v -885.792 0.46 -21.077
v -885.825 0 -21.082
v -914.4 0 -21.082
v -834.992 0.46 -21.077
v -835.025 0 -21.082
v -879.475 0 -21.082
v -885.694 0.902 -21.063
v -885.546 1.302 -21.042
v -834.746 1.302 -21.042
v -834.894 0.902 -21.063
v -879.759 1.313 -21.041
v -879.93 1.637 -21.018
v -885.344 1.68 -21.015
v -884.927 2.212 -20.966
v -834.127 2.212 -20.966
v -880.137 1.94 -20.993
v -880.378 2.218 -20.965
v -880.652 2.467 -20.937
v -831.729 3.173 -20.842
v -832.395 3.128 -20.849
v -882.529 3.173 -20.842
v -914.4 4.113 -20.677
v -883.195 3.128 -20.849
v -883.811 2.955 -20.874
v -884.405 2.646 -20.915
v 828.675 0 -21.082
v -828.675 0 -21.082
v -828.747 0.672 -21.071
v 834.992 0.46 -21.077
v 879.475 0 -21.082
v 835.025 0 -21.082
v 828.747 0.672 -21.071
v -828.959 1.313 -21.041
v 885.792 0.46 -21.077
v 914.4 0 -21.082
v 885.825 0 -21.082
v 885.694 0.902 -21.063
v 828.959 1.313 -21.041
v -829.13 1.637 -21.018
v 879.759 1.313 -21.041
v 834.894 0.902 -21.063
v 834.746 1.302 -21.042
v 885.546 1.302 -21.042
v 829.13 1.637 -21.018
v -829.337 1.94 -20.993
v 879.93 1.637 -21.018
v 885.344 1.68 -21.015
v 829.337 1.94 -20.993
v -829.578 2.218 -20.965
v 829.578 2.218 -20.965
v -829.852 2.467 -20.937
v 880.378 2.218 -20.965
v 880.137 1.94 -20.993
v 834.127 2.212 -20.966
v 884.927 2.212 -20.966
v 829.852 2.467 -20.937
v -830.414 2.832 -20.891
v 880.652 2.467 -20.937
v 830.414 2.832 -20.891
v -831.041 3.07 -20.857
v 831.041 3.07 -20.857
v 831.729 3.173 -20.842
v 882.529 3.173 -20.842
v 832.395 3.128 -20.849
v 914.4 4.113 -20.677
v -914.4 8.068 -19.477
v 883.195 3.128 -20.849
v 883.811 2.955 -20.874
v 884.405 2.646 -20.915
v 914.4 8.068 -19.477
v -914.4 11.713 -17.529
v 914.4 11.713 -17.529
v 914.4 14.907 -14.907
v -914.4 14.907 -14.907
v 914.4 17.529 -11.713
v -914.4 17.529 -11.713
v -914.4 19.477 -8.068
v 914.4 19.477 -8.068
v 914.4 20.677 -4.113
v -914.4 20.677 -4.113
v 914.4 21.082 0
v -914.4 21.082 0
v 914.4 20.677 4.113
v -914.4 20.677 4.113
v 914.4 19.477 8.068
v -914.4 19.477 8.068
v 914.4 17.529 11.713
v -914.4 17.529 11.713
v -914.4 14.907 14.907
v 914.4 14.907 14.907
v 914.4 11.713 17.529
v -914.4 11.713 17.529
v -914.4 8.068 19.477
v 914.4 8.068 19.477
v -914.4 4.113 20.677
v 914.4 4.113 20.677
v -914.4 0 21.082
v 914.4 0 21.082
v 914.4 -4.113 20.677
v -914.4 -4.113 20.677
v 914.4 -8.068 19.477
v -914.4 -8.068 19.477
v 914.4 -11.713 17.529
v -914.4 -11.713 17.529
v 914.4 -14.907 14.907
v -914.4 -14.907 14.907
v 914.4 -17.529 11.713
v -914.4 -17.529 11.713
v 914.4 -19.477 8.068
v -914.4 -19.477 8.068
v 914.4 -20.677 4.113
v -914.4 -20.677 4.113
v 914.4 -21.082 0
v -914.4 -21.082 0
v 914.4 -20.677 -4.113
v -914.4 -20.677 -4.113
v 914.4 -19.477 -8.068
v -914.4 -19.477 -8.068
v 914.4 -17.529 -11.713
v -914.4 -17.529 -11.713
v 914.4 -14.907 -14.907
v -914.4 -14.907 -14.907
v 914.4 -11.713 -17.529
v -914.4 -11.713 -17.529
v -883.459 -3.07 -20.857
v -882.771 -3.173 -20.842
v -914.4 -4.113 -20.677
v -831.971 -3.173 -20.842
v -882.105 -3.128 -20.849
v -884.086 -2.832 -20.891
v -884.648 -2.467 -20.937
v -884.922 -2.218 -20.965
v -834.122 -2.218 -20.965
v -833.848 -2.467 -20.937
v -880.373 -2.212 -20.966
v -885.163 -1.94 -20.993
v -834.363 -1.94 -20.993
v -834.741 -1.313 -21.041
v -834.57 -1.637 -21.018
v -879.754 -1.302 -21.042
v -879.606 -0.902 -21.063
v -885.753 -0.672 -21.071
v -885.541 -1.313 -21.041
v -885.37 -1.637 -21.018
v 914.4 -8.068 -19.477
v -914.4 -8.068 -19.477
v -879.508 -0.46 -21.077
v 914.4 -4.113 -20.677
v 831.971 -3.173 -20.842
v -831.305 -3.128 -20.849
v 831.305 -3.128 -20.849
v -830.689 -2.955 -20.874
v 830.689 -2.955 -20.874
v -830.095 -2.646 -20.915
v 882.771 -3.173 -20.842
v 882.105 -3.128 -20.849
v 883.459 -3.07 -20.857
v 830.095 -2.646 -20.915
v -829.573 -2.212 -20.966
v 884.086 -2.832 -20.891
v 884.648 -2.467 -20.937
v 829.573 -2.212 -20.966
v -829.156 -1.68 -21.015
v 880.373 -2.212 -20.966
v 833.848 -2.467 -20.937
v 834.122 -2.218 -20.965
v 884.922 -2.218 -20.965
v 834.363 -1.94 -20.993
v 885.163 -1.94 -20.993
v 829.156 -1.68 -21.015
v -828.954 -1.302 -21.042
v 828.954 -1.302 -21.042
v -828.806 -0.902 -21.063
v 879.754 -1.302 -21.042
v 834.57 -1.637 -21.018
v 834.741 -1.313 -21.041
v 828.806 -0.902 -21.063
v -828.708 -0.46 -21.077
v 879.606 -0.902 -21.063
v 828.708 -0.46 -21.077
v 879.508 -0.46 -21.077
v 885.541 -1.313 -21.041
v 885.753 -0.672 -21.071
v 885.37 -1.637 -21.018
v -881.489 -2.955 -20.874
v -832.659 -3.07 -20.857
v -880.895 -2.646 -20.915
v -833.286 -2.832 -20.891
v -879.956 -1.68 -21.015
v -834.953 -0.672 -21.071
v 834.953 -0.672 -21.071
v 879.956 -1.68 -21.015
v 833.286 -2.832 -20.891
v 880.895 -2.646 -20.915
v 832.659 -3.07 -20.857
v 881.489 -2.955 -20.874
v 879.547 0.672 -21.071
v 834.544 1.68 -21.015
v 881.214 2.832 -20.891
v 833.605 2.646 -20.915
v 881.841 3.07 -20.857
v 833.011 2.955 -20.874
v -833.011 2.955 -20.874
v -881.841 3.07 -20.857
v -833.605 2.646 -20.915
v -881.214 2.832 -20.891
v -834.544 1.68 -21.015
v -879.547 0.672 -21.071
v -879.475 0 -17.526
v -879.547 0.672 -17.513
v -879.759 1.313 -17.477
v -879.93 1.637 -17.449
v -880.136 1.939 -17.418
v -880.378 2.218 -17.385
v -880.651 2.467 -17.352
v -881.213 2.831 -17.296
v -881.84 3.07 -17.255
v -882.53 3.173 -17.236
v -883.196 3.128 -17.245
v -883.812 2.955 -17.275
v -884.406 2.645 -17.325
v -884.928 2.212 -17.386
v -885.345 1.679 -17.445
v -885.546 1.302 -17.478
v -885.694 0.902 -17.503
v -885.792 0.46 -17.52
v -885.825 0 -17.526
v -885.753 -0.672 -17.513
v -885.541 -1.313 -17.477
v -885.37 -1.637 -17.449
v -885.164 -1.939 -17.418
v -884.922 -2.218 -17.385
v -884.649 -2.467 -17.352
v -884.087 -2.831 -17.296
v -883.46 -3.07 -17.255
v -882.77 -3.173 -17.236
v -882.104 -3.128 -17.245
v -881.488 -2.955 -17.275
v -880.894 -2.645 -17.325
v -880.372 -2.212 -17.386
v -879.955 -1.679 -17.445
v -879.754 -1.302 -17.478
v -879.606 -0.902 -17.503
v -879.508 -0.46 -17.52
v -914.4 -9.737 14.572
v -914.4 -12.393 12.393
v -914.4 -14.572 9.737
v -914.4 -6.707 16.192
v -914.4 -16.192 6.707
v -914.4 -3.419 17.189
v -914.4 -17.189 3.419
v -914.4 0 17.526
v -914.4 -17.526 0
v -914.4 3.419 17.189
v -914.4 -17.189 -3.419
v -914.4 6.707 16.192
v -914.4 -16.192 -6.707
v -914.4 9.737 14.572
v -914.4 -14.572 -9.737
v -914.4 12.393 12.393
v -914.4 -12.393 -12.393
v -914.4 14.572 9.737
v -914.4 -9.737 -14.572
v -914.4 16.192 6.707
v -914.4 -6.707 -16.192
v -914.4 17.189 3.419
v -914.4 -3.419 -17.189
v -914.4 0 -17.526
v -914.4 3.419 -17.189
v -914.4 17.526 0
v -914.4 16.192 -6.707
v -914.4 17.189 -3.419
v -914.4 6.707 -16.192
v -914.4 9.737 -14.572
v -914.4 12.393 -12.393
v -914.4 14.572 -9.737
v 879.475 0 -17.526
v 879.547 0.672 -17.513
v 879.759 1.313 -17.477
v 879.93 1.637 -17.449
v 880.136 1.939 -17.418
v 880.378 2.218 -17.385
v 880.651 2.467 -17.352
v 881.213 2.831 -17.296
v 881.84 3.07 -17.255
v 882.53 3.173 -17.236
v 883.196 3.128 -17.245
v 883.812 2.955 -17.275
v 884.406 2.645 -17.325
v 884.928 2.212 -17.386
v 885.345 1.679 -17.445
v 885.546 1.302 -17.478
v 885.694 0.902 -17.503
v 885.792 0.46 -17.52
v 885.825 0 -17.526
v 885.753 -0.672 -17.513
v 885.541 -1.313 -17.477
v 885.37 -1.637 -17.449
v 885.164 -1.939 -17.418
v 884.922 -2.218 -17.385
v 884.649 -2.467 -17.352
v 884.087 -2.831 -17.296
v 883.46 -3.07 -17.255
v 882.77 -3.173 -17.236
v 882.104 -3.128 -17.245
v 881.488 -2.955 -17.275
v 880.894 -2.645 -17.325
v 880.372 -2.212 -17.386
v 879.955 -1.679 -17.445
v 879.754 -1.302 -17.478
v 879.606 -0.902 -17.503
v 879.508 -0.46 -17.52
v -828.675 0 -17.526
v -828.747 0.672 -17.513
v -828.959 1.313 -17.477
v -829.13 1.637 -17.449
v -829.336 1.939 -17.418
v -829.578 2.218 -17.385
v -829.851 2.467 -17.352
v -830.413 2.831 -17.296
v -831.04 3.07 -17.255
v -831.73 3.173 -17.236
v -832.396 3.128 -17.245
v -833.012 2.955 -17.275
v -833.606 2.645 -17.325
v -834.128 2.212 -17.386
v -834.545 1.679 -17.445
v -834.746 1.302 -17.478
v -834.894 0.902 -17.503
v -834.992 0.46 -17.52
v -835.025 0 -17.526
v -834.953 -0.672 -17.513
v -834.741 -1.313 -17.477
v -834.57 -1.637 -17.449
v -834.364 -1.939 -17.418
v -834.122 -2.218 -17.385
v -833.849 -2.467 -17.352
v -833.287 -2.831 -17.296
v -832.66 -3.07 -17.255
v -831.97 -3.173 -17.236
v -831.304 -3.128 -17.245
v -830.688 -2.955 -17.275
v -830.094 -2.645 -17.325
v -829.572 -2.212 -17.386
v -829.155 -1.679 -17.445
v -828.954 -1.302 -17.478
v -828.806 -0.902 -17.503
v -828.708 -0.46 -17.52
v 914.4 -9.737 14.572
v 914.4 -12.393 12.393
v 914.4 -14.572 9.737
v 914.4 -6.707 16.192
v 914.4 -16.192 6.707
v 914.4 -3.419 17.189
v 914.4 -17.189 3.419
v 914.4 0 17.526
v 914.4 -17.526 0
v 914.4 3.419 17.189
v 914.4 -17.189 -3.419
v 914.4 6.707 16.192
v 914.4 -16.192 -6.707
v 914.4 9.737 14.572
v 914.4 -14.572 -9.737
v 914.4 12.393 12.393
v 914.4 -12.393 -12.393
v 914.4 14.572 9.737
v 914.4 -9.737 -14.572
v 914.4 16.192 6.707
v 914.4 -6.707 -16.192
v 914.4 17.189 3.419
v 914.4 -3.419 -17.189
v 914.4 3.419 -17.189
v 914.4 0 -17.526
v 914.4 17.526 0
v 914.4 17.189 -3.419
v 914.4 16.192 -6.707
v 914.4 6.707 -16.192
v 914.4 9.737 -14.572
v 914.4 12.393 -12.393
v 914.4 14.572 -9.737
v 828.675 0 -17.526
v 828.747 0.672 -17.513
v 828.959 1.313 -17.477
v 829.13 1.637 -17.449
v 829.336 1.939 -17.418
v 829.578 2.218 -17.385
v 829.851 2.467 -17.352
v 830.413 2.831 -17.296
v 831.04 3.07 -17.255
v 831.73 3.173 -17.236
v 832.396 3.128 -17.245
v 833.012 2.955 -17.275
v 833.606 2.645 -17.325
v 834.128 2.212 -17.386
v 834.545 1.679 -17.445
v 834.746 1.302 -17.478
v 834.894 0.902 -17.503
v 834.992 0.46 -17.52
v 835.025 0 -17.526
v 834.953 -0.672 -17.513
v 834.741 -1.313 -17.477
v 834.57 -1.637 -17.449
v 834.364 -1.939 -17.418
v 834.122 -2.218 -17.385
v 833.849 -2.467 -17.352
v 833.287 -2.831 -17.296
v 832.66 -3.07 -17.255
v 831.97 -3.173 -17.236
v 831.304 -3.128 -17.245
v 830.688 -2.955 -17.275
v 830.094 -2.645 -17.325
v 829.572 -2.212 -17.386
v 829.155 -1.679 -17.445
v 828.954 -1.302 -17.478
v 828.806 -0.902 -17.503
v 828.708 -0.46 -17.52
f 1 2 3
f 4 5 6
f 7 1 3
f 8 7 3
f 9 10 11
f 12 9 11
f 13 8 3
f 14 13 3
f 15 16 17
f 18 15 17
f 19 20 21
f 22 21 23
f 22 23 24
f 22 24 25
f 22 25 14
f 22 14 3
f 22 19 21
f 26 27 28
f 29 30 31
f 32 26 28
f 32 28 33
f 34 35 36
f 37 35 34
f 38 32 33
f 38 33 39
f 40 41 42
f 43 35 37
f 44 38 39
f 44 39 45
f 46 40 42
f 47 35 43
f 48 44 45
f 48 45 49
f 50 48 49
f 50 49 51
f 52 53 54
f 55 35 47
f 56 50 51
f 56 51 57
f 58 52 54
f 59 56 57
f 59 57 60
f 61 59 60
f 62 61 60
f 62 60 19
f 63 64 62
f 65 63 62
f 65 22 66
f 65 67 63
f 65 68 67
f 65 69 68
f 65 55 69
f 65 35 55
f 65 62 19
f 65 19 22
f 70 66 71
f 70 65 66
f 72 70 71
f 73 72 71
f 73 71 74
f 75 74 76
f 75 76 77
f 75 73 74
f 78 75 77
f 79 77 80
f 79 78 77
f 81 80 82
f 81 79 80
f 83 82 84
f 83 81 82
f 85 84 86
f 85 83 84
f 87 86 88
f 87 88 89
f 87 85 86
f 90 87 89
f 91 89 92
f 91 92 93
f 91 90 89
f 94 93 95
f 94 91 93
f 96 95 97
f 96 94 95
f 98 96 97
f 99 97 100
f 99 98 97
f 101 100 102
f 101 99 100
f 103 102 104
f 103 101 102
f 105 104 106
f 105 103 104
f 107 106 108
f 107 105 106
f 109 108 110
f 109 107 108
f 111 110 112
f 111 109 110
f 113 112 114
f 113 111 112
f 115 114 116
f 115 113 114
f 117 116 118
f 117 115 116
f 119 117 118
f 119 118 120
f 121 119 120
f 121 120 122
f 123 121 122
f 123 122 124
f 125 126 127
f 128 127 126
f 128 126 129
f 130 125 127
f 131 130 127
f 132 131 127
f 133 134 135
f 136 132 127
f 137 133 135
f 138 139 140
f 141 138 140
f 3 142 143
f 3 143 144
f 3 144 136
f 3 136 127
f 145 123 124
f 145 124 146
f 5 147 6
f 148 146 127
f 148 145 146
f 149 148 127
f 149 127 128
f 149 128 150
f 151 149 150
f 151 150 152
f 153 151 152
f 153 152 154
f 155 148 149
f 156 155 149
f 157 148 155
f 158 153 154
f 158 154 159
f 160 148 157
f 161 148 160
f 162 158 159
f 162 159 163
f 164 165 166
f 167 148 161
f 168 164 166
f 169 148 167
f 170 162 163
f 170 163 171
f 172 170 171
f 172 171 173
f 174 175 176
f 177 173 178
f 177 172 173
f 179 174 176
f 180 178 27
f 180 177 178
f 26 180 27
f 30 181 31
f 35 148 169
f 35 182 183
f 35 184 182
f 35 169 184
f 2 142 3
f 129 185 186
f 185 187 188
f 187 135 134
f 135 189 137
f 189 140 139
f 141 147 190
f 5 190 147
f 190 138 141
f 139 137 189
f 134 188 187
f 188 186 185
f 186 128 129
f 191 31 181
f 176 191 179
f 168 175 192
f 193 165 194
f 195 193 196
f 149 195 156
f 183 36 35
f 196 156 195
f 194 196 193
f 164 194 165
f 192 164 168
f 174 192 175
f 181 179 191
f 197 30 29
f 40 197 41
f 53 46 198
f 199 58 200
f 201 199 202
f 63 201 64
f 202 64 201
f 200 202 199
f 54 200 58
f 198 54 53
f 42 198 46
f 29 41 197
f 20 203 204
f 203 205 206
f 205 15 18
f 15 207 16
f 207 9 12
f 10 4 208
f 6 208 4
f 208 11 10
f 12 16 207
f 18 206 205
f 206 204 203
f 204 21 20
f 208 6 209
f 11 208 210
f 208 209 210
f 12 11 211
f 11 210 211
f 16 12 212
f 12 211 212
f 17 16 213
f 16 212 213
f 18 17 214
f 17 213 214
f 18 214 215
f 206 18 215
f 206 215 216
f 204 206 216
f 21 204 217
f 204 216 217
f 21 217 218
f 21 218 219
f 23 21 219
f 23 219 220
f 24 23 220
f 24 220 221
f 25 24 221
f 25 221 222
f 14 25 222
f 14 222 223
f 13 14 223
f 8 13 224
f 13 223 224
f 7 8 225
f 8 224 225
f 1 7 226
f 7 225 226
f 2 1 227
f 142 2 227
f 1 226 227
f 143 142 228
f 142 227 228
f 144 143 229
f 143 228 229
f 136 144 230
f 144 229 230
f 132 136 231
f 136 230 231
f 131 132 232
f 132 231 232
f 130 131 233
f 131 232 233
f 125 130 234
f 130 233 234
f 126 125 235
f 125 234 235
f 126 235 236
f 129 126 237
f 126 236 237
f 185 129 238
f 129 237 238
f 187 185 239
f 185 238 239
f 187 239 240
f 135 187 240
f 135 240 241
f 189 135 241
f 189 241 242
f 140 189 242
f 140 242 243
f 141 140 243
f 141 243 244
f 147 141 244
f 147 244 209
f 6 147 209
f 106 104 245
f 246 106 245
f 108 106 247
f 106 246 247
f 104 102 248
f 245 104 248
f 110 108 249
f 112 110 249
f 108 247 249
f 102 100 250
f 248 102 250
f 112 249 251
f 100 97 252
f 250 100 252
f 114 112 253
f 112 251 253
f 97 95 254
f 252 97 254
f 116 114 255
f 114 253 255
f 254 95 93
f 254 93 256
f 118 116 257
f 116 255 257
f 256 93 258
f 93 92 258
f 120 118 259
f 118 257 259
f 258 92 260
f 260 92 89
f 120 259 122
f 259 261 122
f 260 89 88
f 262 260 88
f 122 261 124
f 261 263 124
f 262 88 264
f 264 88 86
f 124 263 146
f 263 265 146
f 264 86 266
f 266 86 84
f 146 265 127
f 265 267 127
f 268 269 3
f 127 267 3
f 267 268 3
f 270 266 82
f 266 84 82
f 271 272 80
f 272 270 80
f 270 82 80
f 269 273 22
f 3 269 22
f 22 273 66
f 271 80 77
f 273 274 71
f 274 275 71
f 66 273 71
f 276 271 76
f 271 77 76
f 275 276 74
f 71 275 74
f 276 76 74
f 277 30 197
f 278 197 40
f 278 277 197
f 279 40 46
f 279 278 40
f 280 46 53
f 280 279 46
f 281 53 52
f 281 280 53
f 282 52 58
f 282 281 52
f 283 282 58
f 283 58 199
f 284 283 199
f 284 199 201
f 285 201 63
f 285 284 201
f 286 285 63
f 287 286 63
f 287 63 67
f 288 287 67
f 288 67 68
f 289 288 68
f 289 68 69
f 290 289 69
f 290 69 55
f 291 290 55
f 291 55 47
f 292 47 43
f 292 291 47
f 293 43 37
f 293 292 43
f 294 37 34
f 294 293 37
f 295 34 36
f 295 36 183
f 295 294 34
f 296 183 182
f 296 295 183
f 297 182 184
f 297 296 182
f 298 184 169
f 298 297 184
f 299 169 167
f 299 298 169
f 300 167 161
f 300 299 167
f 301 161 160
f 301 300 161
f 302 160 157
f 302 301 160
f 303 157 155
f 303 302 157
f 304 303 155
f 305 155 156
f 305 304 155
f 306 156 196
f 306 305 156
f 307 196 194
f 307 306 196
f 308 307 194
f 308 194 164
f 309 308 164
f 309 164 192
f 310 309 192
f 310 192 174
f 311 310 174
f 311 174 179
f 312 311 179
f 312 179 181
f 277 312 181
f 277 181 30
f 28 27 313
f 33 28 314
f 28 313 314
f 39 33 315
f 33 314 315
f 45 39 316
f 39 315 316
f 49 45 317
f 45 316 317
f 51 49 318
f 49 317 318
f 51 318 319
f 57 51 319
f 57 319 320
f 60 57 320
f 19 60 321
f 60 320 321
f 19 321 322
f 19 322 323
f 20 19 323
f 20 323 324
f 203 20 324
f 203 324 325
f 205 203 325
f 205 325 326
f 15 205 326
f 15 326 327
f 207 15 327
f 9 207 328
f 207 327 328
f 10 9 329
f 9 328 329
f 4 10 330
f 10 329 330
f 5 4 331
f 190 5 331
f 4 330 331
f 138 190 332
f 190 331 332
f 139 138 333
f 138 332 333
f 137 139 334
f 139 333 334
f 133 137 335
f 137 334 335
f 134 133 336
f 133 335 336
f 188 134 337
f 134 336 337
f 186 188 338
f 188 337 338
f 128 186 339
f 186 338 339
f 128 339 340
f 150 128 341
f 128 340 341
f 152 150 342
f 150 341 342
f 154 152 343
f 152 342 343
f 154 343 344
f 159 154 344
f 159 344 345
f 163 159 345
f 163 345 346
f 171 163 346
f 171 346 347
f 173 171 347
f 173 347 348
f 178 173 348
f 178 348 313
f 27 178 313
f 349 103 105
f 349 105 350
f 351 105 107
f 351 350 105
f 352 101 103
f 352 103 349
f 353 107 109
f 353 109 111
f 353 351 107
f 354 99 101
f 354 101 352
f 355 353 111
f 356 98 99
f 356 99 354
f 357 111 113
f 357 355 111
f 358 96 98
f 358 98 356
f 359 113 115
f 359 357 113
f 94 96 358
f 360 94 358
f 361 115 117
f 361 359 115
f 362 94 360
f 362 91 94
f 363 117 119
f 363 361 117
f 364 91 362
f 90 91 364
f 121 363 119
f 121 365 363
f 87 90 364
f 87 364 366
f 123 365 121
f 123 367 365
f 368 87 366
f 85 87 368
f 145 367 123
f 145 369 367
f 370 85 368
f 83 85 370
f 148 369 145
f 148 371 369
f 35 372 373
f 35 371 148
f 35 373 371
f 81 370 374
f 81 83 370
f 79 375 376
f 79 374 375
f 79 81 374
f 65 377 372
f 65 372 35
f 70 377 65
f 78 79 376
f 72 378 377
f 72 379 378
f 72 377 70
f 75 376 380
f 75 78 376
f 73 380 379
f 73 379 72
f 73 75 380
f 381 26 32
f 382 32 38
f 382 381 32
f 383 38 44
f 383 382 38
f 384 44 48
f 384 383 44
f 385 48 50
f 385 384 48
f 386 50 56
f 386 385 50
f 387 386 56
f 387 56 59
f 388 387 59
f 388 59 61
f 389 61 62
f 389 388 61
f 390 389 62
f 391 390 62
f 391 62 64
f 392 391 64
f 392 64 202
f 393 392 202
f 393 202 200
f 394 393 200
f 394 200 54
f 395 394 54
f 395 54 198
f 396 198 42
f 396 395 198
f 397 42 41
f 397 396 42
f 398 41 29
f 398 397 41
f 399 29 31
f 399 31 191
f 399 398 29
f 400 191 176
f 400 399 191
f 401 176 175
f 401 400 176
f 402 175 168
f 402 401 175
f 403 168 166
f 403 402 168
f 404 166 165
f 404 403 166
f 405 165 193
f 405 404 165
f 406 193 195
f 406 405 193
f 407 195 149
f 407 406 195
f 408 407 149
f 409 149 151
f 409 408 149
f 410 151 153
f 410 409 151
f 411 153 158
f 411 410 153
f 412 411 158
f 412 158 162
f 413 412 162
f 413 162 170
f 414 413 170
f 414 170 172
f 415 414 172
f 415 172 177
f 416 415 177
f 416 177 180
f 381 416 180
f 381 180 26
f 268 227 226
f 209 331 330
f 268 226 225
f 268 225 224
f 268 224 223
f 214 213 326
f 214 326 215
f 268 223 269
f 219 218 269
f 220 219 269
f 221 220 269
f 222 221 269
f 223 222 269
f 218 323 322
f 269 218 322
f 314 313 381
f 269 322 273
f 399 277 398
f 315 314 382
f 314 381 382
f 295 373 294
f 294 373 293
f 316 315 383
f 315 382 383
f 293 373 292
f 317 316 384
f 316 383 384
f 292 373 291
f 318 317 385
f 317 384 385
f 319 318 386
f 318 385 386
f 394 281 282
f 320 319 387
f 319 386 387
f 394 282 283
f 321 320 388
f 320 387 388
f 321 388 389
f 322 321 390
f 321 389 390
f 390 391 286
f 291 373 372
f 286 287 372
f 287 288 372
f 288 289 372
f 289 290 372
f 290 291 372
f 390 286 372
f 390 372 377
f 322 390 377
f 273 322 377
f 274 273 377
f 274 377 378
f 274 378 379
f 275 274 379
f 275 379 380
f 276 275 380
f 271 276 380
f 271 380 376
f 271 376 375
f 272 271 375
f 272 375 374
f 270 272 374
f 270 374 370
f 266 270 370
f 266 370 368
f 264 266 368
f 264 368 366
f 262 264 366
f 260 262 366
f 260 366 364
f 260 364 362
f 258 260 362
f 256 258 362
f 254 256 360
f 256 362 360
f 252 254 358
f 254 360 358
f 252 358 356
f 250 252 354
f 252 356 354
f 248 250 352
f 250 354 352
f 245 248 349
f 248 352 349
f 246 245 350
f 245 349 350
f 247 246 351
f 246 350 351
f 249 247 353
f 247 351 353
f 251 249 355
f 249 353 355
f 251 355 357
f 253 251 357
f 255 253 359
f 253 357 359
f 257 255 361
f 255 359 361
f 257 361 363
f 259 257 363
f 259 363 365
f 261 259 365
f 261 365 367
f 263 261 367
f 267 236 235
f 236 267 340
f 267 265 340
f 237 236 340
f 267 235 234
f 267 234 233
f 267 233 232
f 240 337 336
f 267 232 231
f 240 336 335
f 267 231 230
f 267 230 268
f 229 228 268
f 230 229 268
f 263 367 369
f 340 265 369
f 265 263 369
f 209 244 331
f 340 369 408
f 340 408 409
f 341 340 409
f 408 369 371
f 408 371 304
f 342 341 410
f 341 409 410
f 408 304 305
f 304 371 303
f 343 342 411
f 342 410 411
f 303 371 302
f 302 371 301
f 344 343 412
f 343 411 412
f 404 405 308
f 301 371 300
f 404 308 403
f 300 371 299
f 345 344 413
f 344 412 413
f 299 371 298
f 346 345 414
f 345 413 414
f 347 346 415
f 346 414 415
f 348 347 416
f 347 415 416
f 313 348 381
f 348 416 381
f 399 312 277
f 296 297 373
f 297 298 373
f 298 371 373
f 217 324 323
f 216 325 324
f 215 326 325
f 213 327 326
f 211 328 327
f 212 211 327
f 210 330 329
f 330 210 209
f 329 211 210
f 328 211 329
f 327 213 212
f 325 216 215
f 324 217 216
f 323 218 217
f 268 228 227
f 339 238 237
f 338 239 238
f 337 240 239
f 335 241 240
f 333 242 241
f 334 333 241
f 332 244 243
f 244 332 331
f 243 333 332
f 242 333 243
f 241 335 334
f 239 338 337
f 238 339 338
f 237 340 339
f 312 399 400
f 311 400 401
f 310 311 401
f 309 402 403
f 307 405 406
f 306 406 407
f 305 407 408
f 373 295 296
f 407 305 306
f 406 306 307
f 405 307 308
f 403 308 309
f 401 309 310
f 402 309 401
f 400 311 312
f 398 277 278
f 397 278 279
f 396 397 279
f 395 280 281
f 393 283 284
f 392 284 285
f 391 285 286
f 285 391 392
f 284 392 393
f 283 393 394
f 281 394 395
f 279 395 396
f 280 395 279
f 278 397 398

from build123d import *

# Parameters (mm, degrees)
SKETCH1_R                = 21.082
SKETCH1_R_2              = 17.526
BOSS_EXTRUDE1_DEPTH      = 914.4
BOSS_EXTRUDE1_DEPTH_BACK = 914.4
SKETCH2_R                = 3.175
CUT_EXTRUDE1_DEPTH       = 22.082


with BuildPart() as part:
    # Sketch1 → Boss-Extrude1 (new body, two sides)
    with BuildSketch(Plane(origin=(0, 0, 0), x_dir=(0, 0, -1), z_dir=(1, 0, 0))) as boss_extrude1_sk:
        Circle(SKETCH1_R)
        Circle(SKETCH1_R_2, mode=Mode.SUBTRACT)
    extrude(amount=BOSS_EXTRUDE1_DEPTH)
    extrude(boss_extrude1_sk.sketch, amount=-BOSS_EXTRUDE1_DEPTH_BACK)

    # Sketch2 → Cut-Extrude1 (cut, through all)
    with BuildSketch(Plane.XY):
        with Locations((-831.85, 0)):
            Circle(SKETCH2_R)
        with Locations((-882.65, 0)):
            Circle(SKETCH2_R)
    cut_extrude1 = extrude(amount=-CUT_EXTRUDE1_DEPTH, mode=Mode.SUBTRACT)

    # Mirror1: Cut-Extrude1 across plane
    add(cut_extrude1.mirror(Plane(origin=(0, 0, 0), x_dir=(0, 0, 1), z_dir=(1, 0, 0))), mode=Mode.SUBTRACT)


solid = part.part
